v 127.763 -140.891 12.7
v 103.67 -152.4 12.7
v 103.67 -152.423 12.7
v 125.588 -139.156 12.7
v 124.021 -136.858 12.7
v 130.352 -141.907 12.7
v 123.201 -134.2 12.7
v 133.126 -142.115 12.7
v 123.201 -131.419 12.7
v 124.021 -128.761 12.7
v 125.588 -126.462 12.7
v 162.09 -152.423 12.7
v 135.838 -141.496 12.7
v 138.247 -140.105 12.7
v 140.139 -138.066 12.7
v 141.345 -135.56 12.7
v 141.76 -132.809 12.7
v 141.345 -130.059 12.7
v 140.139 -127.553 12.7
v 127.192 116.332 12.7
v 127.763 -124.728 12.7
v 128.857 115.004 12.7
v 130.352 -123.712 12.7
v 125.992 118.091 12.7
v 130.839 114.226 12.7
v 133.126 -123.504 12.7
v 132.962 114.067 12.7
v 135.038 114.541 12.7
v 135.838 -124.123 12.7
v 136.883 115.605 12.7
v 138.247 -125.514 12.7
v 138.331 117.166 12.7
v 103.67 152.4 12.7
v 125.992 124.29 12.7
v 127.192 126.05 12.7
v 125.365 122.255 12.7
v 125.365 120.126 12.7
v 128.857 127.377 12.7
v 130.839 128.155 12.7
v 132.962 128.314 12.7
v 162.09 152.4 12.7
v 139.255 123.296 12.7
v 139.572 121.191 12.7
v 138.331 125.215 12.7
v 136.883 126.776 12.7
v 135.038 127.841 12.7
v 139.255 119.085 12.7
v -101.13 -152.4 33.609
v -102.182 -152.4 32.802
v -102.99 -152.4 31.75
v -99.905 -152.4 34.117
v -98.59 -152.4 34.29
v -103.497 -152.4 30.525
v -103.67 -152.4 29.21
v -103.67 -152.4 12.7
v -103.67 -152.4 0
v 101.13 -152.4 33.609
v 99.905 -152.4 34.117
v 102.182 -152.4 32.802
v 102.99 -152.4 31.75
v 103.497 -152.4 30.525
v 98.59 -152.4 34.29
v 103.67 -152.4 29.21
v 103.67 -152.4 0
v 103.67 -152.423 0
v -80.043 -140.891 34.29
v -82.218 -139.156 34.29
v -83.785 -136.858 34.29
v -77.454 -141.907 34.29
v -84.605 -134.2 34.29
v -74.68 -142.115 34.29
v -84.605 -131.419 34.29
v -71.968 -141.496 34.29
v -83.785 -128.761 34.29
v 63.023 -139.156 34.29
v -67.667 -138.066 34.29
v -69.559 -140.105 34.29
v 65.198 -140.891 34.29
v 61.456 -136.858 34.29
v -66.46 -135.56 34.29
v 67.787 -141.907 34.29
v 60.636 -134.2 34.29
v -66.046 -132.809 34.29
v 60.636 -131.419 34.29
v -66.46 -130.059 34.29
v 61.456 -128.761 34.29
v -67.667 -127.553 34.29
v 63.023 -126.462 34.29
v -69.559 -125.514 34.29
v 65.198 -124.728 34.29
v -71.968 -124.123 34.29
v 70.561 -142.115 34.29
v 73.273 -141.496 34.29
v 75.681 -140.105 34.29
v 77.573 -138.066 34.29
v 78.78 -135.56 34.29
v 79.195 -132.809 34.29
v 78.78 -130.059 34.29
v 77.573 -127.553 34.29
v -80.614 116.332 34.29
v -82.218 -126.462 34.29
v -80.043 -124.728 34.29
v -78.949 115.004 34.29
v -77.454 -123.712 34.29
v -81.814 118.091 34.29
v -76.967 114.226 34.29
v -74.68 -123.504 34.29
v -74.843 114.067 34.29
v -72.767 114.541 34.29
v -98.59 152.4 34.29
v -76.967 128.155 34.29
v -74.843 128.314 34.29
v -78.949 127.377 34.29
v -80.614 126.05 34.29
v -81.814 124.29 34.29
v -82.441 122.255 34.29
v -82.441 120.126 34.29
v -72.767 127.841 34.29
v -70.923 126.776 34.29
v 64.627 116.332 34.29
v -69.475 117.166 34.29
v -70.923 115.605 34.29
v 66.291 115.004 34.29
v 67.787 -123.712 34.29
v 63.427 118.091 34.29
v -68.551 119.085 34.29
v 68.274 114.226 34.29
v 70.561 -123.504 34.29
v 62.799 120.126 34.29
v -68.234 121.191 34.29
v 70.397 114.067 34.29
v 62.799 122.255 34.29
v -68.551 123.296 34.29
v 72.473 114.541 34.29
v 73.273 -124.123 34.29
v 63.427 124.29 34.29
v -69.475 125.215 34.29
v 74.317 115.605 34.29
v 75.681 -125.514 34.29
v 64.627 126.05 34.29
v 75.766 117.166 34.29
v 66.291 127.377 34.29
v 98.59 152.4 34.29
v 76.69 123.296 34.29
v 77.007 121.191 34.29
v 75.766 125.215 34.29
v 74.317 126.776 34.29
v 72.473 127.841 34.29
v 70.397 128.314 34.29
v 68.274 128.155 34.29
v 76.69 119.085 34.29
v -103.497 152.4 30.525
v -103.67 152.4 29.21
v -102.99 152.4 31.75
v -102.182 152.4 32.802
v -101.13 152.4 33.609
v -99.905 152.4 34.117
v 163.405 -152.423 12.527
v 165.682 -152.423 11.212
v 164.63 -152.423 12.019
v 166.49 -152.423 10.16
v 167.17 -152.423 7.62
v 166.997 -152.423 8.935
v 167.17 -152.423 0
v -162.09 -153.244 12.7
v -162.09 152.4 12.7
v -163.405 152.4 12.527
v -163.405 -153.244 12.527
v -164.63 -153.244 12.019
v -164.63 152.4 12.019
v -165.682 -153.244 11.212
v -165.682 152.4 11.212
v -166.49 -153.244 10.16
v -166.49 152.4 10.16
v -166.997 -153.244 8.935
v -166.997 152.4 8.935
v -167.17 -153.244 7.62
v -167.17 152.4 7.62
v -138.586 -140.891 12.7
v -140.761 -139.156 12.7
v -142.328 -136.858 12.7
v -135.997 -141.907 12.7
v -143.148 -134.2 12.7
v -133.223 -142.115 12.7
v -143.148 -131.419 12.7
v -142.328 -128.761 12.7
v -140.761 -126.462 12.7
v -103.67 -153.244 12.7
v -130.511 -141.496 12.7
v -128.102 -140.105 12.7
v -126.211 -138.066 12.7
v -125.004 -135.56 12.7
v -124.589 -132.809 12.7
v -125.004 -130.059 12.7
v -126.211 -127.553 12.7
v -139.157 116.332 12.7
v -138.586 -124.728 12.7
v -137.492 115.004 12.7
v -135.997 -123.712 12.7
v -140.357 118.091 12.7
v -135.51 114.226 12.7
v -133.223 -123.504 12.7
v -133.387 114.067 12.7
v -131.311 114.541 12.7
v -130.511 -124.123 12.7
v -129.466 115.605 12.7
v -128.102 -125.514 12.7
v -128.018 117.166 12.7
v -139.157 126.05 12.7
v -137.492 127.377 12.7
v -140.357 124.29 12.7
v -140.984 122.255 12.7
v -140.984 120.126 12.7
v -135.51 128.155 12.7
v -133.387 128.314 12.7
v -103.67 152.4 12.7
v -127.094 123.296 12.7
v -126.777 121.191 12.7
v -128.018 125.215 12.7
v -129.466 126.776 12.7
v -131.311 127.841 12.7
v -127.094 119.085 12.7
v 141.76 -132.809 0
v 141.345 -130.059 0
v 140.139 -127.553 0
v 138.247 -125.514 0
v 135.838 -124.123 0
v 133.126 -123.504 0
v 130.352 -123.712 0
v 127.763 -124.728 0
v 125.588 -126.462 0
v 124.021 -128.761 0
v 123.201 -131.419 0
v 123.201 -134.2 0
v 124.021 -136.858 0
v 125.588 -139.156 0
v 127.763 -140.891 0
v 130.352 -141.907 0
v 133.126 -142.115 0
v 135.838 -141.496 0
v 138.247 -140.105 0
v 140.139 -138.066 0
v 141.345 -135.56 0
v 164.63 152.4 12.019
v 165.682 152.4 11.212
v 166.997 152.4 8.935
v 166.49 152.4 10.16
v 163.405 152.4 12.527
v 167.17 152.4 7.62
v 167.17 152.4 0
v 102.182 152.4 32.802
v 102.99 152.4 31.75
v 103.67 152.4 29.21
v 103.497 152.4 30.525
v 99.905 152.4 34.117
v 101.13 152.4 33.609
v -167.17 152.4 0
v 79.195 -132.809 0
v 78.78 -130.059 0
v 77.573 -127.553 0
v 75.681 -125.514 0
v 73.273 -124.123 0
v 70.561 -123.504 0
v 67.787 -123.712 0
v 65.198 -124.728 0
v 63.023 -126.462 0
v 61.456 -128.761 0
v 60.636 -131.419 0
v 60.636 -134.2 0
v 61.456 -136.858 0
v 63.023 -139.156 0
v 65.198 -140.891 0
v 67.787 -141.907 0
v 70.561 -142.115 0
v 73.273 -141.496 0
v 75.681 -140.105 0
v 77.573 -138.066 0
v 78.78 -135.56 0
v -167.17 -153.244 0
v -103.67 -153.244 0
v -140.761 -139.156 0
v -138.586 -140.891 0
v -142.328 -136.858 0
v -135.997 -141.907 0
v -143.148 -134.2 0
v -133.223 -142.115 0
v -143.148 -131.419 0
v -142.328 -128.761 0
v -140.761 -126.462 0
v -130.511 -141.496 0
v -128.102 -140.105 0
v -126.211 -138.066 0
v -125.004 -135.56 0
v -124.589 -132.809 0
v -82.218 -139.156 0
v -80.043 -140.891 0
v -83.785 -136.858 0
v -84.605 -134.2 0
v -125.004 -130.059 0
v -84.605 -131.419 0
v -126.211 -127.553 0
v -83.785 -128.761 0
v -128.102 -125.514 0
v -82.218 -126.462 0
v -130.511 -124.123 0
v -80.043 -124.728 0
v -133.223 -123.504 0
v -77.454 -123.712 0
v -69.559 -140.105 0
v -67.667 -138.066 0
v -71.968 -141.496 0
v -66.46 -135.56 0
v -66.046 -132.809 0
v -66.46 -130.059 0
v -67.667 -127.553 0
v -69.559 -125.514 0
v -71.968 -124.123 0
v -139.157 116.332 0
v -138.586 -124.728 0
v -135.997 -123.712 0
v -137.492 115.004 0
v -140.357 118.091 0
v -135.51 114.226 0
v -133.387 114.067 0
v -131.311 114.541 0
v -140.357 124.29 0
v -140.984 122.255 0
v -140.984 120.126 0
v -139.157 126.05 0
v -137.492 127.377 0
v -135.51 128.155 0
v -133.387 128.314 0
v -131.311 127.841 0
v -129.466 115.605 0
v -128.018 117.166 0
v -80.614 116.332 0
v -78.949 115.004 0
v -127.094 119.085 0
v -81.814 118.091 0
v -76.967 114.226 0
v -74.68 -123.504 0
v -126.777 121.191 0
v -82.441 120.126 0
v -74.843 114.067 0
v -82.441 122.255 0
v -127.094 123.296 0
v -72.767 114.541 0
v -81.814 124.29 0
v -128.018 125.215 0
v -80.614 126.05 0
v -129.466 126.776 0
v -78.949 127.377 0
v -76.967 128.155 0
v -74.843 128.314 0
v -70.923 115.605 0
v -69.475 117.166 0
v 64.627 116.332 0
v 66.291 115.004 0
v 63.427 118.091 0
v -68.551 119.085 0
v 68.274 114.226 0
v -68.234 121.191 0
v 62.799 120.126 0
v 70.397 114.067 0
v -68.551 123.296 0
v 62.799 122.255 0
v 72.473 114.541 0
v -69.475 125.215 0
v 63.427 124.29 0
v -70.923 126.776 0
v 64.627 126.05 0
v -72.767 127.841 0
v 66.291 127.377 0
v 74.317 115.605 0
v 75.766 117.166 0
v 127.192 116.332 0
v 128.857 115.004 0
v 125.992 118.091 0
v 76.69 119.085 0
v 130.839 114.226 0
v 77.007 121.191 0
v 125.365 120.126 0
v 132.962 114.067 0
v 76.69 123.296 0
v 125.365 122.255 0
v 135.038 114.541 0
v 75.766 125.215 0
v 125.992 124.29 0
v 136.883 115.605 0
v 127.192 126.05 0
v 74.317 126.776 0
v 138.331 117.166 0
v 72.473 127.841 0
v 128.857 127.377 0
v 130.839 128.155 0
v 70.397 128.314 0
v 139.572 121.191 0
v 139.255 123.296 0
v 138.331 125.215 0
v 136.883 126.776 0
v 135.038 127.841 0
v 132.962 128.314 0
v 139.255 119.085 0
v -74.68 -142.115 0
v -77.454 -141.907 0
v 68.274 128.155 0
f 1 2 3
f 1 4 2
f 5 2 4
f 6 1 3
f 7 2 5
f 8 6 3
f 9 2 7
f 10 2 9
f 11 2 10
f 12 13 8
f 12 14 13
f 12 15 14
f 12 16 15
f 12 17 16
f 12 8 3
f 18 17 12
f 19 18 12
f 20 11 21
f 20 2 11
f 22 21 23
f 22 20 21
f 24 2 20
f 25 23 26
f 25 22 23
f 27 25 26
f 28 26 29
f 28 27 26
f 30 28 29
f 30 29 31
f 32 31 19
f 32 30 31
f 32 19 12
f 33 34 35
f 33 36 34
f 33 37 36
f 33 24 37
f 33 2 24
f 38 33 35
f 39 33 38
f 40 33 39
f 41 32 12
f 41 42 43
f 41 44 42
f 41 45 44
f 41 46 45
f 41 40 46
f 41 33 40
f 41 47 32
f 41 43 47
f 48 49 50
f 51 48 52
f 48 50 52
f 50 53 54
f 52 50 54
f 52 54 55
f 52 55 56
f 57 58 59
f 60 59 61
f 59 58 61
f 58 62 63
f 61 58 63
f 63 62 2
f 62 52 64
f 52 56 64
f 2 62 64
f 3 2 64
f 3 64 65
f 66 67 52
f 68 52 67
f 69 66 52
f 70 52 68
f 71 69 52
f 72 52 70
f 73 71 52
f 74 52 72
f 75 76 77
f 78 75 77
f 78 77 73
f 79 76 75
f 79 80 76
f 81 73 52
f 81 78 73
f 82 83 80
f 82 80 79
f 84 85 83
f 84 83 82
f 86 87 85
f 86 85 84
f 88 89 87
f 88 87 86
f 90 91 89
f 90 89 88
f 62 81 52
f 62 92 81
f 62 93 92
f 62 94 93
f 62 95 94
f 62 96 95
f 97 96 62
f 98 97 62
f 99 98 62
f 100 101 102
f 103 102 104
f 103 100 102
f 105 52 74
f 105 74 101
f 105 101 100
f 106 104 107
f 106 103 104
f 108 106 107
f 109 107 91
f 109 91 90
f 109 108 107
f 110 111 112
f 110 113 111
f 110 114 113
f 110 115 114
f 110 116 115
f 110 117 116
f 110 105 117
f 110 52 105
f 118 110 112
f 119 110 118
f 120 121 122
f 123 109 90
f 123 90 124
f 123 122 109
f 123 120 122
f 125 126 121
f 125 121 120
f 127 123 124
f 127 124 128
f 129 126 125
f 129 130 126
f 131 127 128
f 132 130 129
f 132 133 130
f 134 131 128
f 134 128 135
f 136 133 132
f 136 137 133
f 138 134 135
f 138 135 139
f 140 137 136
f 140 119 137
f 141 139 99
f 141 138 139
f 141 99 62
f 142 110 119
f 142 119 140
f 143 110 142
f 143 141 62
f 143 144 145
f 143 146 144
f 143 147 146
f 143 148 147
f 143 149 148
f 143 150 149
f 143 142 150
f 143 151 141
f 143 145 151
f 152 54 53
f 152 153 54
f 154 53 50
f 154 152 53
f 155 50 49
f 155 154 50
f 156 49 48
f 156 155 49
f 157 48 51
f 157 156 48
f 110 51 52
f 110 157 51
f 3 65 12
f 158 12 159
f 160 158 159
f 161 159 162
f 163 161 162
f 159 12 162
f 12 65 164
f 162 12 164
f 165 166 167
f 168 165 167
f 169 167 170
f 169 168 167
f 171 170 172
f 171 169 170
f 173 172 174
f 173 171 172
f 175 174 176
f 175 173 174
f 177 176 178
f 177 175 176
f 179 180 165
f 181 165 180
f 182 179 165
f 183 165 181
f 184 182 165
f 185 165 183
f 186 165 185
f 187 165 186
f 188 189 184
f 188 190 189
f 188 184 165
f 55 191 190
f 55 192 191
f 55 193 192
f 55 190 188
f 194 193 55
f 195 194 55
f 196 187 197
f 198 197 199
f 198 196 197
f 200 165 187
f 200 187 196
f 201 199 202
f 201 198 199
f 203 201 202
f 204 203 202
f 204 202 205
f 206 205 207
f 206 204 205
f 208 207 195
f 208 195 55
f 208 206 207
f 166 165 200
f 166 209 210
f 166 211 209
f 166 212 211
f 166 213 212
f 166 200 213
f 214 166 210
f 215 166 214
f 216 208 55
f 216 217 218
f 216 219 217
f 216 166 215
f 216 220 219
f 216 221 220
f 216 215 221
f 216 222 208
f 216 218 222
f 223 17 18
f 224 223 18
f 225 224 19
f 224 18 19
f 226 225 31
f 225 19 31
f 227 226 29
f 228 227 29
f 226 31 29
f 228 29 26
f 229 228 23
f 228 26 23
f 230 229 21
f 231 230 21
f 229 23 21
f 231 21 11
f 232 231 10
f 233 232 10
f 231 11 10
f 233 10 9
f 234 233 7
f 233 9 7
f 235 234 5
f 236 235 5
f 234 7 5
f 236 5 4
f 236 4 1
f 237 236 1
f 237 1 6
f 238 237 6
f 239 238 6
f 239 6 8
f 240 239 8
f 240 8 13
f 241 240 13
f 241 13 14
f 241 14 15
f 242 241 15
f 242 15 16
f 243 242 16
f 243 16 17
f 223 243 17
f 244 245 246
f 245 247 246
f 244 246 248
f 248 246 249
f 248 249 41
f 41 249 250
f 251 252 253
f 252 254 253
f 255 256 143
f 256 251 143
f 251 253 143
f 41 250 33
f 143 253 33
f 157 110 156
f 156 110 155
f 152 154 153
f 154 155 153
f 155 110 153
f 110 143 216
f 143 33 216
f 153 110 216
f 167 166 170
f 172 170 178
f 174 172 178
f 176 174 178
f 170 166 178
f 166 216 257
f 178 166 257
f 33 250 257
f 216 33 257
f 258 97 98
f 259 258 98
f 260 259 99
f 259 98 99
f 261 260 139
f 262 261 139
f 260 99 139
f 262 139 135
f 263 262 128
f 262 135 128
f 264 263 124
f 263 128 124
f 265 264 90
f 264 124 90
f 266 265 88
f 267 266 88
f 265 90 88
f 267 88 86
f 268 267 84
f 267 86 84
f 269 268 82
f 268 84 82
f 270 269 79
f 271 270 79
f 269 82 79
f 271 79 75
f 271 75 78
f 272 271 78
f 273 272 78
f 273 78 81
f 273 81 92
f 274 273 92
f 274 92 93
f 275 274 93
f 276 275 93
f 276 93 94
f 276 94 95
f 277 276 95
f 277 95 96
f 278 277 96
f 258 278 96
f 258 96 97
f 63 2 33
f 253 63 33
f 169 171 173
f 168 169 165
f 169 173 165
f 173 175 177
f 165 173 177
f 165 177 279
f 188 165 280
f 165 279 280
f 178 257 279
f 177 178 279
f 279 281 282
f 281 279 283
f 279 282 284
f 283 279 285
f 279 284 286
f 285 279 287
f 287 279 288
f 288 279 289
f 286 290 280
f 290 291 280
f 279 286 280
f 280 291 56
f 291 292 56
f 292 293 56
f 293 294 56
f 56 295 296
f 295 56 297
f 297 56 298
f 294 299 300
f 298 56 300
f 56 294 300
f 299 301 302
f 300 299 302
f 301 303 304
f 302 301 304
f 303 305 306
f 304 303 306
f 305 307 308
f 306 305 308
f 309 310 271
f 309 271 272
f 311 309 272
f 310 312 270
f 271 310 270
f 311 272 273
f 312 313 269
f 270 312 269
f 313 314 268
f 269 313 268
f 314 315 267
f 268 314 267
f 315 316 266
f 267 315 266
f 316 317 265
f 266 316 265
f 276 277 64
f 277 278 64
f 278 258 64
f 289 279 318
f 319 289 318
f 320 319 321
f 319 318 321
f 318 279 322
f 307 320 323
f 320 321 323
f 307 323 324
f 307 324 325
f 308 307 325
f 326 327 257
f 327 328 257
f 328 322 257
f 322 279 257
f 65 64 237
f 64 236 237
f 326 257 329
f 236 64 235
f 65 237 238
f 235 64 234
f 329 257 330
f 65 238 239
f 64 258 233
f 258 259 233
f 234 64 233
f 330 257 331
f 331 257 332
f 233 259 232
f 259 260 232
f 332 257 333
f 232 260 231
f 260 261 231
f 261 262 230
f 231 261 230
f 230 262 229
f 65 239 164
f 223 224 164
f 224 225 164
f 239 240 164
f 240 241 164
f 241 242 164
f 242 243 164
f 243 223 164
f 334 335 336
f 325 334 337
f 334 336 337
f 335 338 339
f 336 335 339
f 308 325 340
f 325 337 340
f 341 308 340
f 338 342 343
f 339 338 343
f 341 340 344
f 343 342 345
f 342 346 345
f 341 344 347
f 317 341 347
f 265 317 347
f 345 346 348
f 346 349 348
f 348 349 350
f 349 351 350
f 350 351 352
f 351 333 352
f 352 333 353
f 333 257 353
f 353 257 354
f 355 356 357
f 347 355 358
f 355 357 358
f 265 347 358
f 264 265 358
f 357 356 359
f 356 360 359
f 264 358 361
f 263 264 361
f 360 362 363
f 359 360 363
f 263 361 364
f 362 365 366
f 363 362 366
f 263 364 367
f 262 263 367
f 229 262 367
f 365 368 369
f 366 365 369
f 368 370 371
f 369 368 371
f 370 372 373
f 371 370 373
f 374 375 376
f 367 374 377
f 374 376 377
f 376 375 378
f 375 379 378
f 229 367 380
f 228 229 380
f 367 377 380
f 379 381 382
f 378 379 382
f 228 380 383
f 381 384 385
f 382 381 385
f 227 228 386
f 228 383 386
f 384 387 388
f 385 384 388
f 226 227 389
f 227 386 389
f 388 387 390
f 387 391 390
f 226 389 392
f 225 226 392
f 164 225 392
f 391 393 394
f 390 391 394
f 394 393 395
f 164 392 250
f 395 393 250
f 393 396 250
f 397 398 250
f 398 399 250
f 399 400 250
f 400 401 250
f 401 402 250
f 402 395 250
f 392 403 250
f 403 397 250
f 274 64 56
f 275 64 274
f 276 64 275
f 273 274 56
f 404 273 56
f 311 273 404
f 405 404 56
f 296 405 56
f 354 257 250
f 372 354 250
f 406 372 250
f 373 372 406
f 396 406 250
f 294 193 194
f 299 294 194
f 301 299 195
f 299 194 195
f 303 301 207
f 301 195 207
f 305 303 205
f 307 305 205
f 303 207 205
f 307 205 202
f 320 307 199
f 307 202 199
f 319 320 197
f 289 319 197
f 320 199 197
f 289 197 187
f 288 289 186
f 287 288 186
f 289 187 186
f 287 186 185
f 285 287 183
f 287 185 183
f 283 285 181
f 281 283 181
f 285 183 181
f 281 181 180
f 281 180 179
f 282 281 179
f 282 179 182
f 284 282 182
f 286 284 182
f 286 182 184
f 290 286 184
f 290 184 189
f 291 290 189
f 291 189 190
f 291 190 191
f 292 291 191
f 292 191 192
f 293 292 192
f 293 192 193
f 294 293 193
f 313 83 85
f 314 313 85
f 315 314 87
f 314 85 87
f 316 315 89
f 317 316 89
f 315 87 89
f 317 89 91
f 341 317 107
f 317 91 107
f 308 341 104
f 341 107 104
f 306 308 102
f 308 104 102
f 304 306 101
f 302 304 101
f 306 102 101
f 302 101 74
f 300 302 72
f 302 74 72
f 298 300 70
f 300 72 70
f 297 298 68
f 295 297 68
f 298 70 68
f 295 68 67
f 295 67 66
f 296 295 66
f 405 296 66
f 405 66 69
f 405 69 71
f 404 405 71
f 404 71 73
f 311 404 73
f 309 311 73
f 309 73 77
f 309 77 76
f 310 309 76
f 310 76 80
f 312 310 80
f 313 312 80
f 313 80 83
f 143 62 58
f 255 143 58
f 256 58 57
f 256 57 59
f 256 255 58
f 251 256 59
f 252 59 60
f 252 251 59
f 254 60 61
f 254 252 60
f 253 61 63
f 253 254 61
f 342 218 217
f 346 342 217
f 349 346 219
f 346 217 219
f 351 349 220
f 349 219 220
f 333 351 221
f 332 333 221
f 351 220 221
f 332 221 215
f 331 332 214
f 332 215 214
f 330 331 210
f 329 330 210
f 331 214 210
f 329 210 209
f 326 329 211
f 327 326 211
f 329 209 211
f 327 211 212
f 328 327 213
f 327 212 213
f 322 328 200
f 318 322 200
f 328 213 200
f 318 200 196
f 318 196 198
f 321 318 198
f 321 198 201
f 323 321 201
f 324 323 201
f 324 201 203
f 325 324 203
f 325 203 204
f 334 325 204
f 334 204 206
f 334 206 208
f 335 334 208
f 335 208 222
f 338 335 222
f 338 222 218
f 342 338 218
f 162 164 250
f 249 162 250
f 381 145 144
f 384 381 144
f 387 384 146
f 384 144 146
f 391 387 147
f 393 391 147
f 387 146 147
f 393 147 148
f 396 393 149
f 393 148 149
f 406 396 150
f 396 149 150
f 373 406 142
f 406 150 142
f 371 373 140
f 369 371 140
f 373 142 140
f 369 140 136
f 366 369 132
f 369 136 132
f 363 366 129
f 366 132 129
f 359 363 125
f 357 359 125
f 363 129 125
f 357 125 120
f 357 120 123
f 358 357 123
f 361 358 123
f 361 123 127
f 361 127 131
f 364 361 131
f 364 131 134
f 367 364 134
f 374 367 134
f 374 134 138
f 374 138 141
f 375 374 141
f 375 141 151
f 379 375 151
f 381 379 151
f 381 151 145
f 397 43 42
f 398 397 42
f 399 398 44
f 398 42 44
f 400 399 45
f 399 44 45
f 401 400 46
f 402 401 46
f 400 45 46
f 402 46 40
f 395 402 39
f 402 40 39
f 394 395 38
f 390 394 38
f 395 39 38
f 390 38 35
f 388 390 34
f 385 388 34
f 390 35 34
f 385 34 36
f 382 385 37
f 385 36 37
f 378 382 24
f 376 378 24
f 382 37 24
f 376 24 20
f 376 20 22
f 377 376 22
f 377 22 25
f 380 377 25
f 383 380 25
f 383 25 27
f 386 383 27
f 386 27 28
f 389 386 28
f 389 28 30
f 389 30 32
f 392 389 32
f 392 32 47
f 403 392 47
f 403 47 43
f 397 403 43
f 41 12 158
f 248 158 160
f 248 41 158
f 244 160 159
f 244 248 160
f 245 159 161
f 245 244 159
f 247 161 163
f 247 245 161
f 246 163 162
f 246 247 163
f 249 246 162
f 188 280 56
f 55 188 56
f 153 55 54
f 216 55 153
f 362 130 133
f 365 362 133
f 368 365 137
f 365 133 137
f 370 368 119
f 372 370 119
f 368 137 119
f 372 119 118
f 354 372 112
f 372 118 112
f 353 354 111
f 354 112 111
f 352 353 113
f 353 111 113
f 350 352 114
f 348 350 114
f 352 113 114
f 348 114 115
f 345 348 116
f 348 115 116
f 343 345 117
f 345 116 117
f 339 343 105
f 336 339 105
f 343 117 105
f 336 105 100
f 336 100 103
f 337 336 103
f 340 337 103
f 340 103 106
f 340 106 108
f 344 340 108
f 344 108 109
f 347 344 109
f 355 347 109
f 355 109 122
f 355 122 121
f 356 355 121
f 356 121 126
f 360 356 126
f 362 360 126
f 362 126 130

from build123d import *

# Parameters (mm, degrees)
F0_W     = 207.3402
F0_H     = 304.8
F1_DEPTH = 34.29
F2_DEPTH = 12.7
F3_R     = 5.08
F4_R     = 7.14375
F4_R_2   = 9.331431
F5_DEPTH = 34.291


with BuildPart() as f1:
    # F0 (on Top) → F1 (new body)
    with BuildSketch(Plane.XY):
        Rectangle(F0_W, F0_H)
    extrude(amount=F1_DEPTH)

    # F0 (on Top) → F2 (join)
    with BuildSketch(Plane.XY):
        Polygon((-103.6701, -152.4), (-103.6701, 152.4), (-167.1701, 152.4), (-167.1701, -153.244078), (-103.6701, -153.244078), align=None)
        Polygon((167.1701, 152.4), (103.6701, 152.4), (103.6701, -152.4), (103.6701, -152.423114), (167.1701, -152.423114), align=None)
    extrude(amount=F2_DEPTH)

    # F3
    f3_edges = [f1.edges().sort_by_distance(p)[0] for p in [
        (-167.1701, -0.422039, 12.7),
        (-103.6701, 0, 34.29),
        (103.6701, 0, 34.29),
        (167.1701, -0.011557, 12.7),
    ]]
    fillet(f3_edges, radius=F3_R)

    # F4 (on face) → F5 (cut, through all)
    with BuildSketch(Plane.XY.offset(34.29)):
        with Locations((-133.920491, 121.190689)):
            Circle(F4_R)
        with Locations((-75.377315, 121.190689)):
            Circle(F4_R)
        with Locations((69.863357, 121.190689)):
            Circle(F4_R)
        with Locations((132.428586, 121.190689)):
            Circle(F4_R)
        with Locations((132.428586, -132.809311)):
            Circle(F4_R_2)
        with Locations((69.863357, -132.809311)):
            Circle(F4_R_2)
        with Locations((-75.377315, -132.809311)):
            Circle(F4_R_2)
        with Locations((-133.920491, -132.809311)):
            Circle(F4_R_2)
    extrude(amount=-F5_DEPTH, mode=Mode.SUBTRACT)


solid = f1.part
